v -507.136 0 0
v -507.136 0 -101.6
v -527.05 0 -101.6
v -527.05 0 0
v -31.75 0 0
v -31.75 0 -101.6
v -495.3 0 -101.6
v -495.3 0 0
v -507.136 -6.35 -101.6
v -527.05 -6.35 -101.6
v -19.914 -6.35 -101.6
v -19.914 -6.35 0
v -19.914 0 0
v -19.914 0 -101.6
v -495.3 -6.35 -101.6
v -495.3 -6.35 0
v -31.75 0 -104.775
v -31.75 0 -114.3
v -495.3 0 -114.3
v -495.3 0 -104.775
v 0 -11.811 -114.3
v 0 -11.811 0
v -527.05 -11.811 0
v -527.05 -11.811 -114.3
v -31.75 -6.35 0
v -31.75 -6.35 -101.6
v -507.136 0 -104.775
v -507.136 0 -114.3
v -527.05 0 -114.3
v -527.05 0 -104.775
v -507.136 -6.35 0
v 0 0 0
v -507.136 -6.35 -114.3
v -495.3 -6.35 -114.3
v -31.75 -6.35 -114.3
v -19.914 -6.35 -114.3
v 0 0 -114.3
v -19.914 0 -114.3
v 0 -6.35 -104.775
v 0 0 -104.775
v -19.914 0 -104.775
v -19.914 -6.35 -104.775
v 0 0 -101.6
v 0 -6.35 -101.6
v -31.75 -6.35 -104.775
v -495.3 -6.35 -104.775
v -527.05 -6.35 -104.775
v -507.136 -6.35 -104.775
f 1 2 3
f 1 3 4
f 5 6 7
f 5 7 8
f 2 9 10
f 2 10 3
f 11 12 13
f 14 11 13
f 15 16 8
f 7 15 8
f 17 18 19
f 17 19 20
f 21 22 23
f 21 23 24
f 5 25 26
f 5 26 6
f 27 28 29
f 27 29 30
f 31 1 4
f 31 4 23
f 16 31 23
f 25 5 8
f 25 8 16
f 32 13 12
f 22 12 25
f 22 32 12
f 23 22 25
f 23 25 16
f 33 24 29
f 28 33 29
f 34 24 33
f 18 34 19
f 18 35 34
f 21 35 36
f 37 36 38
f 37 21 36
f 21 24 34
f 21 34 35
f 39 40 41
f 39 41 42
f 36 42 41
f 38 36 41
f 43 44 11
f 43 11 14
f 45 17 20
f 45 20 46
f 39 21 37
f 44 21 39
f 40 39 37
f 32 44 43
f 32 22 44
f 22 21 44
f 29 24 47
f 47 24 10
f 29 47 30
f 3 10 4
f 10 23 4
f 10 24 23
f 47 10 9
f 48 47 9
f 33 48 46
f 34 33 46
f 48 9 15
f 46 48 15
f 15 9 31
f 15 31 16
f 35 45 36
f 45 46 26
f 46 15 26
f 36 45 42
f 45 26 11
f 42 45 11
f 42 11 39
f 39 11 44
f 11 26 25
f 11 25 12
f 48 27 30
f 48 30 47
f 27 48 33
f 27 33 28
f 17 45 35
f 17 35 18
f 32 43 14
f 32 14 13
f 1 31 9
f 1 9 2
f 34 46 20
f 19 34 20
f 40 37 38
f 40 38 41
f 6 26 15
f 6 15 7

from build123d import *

# Parameters (mm, degrees)
F1_DEPTH = 527.05
F2_W     = 11.8364
F2_H     = 6.35
F3_DEPTH = 114.301


with BuildPart() as f1:
    # F0 (on Right) → F1 (new body)
    with BuildSketch(Plane.YZ):
        Polygon((0, 0), (-11.811, 0), (-11.811, -101.544328), (-11.811, -104.719328), (-11.811, -114.3), (0, -114.3), (0, -104.775), (-6.35, -104.775), (-6.35, -101.6), (0, -101.6), align=None)
    extrude(amount=-F1_DEPTH)

    # F2 (on Top) → F3 (cut, through all)
    with BuildSketch(Plane.XY):
        with Locations((-25.8318, -3.175)):
            Rectangle(F2_W, F2_H)
        with Locations((-501.2182, -3.175)):
            Rectangle(F2_W, F2_H)
    extrude(amount=-F3_DEPTH, mode=Mode.SUBTRACT)


solid = f1.part
